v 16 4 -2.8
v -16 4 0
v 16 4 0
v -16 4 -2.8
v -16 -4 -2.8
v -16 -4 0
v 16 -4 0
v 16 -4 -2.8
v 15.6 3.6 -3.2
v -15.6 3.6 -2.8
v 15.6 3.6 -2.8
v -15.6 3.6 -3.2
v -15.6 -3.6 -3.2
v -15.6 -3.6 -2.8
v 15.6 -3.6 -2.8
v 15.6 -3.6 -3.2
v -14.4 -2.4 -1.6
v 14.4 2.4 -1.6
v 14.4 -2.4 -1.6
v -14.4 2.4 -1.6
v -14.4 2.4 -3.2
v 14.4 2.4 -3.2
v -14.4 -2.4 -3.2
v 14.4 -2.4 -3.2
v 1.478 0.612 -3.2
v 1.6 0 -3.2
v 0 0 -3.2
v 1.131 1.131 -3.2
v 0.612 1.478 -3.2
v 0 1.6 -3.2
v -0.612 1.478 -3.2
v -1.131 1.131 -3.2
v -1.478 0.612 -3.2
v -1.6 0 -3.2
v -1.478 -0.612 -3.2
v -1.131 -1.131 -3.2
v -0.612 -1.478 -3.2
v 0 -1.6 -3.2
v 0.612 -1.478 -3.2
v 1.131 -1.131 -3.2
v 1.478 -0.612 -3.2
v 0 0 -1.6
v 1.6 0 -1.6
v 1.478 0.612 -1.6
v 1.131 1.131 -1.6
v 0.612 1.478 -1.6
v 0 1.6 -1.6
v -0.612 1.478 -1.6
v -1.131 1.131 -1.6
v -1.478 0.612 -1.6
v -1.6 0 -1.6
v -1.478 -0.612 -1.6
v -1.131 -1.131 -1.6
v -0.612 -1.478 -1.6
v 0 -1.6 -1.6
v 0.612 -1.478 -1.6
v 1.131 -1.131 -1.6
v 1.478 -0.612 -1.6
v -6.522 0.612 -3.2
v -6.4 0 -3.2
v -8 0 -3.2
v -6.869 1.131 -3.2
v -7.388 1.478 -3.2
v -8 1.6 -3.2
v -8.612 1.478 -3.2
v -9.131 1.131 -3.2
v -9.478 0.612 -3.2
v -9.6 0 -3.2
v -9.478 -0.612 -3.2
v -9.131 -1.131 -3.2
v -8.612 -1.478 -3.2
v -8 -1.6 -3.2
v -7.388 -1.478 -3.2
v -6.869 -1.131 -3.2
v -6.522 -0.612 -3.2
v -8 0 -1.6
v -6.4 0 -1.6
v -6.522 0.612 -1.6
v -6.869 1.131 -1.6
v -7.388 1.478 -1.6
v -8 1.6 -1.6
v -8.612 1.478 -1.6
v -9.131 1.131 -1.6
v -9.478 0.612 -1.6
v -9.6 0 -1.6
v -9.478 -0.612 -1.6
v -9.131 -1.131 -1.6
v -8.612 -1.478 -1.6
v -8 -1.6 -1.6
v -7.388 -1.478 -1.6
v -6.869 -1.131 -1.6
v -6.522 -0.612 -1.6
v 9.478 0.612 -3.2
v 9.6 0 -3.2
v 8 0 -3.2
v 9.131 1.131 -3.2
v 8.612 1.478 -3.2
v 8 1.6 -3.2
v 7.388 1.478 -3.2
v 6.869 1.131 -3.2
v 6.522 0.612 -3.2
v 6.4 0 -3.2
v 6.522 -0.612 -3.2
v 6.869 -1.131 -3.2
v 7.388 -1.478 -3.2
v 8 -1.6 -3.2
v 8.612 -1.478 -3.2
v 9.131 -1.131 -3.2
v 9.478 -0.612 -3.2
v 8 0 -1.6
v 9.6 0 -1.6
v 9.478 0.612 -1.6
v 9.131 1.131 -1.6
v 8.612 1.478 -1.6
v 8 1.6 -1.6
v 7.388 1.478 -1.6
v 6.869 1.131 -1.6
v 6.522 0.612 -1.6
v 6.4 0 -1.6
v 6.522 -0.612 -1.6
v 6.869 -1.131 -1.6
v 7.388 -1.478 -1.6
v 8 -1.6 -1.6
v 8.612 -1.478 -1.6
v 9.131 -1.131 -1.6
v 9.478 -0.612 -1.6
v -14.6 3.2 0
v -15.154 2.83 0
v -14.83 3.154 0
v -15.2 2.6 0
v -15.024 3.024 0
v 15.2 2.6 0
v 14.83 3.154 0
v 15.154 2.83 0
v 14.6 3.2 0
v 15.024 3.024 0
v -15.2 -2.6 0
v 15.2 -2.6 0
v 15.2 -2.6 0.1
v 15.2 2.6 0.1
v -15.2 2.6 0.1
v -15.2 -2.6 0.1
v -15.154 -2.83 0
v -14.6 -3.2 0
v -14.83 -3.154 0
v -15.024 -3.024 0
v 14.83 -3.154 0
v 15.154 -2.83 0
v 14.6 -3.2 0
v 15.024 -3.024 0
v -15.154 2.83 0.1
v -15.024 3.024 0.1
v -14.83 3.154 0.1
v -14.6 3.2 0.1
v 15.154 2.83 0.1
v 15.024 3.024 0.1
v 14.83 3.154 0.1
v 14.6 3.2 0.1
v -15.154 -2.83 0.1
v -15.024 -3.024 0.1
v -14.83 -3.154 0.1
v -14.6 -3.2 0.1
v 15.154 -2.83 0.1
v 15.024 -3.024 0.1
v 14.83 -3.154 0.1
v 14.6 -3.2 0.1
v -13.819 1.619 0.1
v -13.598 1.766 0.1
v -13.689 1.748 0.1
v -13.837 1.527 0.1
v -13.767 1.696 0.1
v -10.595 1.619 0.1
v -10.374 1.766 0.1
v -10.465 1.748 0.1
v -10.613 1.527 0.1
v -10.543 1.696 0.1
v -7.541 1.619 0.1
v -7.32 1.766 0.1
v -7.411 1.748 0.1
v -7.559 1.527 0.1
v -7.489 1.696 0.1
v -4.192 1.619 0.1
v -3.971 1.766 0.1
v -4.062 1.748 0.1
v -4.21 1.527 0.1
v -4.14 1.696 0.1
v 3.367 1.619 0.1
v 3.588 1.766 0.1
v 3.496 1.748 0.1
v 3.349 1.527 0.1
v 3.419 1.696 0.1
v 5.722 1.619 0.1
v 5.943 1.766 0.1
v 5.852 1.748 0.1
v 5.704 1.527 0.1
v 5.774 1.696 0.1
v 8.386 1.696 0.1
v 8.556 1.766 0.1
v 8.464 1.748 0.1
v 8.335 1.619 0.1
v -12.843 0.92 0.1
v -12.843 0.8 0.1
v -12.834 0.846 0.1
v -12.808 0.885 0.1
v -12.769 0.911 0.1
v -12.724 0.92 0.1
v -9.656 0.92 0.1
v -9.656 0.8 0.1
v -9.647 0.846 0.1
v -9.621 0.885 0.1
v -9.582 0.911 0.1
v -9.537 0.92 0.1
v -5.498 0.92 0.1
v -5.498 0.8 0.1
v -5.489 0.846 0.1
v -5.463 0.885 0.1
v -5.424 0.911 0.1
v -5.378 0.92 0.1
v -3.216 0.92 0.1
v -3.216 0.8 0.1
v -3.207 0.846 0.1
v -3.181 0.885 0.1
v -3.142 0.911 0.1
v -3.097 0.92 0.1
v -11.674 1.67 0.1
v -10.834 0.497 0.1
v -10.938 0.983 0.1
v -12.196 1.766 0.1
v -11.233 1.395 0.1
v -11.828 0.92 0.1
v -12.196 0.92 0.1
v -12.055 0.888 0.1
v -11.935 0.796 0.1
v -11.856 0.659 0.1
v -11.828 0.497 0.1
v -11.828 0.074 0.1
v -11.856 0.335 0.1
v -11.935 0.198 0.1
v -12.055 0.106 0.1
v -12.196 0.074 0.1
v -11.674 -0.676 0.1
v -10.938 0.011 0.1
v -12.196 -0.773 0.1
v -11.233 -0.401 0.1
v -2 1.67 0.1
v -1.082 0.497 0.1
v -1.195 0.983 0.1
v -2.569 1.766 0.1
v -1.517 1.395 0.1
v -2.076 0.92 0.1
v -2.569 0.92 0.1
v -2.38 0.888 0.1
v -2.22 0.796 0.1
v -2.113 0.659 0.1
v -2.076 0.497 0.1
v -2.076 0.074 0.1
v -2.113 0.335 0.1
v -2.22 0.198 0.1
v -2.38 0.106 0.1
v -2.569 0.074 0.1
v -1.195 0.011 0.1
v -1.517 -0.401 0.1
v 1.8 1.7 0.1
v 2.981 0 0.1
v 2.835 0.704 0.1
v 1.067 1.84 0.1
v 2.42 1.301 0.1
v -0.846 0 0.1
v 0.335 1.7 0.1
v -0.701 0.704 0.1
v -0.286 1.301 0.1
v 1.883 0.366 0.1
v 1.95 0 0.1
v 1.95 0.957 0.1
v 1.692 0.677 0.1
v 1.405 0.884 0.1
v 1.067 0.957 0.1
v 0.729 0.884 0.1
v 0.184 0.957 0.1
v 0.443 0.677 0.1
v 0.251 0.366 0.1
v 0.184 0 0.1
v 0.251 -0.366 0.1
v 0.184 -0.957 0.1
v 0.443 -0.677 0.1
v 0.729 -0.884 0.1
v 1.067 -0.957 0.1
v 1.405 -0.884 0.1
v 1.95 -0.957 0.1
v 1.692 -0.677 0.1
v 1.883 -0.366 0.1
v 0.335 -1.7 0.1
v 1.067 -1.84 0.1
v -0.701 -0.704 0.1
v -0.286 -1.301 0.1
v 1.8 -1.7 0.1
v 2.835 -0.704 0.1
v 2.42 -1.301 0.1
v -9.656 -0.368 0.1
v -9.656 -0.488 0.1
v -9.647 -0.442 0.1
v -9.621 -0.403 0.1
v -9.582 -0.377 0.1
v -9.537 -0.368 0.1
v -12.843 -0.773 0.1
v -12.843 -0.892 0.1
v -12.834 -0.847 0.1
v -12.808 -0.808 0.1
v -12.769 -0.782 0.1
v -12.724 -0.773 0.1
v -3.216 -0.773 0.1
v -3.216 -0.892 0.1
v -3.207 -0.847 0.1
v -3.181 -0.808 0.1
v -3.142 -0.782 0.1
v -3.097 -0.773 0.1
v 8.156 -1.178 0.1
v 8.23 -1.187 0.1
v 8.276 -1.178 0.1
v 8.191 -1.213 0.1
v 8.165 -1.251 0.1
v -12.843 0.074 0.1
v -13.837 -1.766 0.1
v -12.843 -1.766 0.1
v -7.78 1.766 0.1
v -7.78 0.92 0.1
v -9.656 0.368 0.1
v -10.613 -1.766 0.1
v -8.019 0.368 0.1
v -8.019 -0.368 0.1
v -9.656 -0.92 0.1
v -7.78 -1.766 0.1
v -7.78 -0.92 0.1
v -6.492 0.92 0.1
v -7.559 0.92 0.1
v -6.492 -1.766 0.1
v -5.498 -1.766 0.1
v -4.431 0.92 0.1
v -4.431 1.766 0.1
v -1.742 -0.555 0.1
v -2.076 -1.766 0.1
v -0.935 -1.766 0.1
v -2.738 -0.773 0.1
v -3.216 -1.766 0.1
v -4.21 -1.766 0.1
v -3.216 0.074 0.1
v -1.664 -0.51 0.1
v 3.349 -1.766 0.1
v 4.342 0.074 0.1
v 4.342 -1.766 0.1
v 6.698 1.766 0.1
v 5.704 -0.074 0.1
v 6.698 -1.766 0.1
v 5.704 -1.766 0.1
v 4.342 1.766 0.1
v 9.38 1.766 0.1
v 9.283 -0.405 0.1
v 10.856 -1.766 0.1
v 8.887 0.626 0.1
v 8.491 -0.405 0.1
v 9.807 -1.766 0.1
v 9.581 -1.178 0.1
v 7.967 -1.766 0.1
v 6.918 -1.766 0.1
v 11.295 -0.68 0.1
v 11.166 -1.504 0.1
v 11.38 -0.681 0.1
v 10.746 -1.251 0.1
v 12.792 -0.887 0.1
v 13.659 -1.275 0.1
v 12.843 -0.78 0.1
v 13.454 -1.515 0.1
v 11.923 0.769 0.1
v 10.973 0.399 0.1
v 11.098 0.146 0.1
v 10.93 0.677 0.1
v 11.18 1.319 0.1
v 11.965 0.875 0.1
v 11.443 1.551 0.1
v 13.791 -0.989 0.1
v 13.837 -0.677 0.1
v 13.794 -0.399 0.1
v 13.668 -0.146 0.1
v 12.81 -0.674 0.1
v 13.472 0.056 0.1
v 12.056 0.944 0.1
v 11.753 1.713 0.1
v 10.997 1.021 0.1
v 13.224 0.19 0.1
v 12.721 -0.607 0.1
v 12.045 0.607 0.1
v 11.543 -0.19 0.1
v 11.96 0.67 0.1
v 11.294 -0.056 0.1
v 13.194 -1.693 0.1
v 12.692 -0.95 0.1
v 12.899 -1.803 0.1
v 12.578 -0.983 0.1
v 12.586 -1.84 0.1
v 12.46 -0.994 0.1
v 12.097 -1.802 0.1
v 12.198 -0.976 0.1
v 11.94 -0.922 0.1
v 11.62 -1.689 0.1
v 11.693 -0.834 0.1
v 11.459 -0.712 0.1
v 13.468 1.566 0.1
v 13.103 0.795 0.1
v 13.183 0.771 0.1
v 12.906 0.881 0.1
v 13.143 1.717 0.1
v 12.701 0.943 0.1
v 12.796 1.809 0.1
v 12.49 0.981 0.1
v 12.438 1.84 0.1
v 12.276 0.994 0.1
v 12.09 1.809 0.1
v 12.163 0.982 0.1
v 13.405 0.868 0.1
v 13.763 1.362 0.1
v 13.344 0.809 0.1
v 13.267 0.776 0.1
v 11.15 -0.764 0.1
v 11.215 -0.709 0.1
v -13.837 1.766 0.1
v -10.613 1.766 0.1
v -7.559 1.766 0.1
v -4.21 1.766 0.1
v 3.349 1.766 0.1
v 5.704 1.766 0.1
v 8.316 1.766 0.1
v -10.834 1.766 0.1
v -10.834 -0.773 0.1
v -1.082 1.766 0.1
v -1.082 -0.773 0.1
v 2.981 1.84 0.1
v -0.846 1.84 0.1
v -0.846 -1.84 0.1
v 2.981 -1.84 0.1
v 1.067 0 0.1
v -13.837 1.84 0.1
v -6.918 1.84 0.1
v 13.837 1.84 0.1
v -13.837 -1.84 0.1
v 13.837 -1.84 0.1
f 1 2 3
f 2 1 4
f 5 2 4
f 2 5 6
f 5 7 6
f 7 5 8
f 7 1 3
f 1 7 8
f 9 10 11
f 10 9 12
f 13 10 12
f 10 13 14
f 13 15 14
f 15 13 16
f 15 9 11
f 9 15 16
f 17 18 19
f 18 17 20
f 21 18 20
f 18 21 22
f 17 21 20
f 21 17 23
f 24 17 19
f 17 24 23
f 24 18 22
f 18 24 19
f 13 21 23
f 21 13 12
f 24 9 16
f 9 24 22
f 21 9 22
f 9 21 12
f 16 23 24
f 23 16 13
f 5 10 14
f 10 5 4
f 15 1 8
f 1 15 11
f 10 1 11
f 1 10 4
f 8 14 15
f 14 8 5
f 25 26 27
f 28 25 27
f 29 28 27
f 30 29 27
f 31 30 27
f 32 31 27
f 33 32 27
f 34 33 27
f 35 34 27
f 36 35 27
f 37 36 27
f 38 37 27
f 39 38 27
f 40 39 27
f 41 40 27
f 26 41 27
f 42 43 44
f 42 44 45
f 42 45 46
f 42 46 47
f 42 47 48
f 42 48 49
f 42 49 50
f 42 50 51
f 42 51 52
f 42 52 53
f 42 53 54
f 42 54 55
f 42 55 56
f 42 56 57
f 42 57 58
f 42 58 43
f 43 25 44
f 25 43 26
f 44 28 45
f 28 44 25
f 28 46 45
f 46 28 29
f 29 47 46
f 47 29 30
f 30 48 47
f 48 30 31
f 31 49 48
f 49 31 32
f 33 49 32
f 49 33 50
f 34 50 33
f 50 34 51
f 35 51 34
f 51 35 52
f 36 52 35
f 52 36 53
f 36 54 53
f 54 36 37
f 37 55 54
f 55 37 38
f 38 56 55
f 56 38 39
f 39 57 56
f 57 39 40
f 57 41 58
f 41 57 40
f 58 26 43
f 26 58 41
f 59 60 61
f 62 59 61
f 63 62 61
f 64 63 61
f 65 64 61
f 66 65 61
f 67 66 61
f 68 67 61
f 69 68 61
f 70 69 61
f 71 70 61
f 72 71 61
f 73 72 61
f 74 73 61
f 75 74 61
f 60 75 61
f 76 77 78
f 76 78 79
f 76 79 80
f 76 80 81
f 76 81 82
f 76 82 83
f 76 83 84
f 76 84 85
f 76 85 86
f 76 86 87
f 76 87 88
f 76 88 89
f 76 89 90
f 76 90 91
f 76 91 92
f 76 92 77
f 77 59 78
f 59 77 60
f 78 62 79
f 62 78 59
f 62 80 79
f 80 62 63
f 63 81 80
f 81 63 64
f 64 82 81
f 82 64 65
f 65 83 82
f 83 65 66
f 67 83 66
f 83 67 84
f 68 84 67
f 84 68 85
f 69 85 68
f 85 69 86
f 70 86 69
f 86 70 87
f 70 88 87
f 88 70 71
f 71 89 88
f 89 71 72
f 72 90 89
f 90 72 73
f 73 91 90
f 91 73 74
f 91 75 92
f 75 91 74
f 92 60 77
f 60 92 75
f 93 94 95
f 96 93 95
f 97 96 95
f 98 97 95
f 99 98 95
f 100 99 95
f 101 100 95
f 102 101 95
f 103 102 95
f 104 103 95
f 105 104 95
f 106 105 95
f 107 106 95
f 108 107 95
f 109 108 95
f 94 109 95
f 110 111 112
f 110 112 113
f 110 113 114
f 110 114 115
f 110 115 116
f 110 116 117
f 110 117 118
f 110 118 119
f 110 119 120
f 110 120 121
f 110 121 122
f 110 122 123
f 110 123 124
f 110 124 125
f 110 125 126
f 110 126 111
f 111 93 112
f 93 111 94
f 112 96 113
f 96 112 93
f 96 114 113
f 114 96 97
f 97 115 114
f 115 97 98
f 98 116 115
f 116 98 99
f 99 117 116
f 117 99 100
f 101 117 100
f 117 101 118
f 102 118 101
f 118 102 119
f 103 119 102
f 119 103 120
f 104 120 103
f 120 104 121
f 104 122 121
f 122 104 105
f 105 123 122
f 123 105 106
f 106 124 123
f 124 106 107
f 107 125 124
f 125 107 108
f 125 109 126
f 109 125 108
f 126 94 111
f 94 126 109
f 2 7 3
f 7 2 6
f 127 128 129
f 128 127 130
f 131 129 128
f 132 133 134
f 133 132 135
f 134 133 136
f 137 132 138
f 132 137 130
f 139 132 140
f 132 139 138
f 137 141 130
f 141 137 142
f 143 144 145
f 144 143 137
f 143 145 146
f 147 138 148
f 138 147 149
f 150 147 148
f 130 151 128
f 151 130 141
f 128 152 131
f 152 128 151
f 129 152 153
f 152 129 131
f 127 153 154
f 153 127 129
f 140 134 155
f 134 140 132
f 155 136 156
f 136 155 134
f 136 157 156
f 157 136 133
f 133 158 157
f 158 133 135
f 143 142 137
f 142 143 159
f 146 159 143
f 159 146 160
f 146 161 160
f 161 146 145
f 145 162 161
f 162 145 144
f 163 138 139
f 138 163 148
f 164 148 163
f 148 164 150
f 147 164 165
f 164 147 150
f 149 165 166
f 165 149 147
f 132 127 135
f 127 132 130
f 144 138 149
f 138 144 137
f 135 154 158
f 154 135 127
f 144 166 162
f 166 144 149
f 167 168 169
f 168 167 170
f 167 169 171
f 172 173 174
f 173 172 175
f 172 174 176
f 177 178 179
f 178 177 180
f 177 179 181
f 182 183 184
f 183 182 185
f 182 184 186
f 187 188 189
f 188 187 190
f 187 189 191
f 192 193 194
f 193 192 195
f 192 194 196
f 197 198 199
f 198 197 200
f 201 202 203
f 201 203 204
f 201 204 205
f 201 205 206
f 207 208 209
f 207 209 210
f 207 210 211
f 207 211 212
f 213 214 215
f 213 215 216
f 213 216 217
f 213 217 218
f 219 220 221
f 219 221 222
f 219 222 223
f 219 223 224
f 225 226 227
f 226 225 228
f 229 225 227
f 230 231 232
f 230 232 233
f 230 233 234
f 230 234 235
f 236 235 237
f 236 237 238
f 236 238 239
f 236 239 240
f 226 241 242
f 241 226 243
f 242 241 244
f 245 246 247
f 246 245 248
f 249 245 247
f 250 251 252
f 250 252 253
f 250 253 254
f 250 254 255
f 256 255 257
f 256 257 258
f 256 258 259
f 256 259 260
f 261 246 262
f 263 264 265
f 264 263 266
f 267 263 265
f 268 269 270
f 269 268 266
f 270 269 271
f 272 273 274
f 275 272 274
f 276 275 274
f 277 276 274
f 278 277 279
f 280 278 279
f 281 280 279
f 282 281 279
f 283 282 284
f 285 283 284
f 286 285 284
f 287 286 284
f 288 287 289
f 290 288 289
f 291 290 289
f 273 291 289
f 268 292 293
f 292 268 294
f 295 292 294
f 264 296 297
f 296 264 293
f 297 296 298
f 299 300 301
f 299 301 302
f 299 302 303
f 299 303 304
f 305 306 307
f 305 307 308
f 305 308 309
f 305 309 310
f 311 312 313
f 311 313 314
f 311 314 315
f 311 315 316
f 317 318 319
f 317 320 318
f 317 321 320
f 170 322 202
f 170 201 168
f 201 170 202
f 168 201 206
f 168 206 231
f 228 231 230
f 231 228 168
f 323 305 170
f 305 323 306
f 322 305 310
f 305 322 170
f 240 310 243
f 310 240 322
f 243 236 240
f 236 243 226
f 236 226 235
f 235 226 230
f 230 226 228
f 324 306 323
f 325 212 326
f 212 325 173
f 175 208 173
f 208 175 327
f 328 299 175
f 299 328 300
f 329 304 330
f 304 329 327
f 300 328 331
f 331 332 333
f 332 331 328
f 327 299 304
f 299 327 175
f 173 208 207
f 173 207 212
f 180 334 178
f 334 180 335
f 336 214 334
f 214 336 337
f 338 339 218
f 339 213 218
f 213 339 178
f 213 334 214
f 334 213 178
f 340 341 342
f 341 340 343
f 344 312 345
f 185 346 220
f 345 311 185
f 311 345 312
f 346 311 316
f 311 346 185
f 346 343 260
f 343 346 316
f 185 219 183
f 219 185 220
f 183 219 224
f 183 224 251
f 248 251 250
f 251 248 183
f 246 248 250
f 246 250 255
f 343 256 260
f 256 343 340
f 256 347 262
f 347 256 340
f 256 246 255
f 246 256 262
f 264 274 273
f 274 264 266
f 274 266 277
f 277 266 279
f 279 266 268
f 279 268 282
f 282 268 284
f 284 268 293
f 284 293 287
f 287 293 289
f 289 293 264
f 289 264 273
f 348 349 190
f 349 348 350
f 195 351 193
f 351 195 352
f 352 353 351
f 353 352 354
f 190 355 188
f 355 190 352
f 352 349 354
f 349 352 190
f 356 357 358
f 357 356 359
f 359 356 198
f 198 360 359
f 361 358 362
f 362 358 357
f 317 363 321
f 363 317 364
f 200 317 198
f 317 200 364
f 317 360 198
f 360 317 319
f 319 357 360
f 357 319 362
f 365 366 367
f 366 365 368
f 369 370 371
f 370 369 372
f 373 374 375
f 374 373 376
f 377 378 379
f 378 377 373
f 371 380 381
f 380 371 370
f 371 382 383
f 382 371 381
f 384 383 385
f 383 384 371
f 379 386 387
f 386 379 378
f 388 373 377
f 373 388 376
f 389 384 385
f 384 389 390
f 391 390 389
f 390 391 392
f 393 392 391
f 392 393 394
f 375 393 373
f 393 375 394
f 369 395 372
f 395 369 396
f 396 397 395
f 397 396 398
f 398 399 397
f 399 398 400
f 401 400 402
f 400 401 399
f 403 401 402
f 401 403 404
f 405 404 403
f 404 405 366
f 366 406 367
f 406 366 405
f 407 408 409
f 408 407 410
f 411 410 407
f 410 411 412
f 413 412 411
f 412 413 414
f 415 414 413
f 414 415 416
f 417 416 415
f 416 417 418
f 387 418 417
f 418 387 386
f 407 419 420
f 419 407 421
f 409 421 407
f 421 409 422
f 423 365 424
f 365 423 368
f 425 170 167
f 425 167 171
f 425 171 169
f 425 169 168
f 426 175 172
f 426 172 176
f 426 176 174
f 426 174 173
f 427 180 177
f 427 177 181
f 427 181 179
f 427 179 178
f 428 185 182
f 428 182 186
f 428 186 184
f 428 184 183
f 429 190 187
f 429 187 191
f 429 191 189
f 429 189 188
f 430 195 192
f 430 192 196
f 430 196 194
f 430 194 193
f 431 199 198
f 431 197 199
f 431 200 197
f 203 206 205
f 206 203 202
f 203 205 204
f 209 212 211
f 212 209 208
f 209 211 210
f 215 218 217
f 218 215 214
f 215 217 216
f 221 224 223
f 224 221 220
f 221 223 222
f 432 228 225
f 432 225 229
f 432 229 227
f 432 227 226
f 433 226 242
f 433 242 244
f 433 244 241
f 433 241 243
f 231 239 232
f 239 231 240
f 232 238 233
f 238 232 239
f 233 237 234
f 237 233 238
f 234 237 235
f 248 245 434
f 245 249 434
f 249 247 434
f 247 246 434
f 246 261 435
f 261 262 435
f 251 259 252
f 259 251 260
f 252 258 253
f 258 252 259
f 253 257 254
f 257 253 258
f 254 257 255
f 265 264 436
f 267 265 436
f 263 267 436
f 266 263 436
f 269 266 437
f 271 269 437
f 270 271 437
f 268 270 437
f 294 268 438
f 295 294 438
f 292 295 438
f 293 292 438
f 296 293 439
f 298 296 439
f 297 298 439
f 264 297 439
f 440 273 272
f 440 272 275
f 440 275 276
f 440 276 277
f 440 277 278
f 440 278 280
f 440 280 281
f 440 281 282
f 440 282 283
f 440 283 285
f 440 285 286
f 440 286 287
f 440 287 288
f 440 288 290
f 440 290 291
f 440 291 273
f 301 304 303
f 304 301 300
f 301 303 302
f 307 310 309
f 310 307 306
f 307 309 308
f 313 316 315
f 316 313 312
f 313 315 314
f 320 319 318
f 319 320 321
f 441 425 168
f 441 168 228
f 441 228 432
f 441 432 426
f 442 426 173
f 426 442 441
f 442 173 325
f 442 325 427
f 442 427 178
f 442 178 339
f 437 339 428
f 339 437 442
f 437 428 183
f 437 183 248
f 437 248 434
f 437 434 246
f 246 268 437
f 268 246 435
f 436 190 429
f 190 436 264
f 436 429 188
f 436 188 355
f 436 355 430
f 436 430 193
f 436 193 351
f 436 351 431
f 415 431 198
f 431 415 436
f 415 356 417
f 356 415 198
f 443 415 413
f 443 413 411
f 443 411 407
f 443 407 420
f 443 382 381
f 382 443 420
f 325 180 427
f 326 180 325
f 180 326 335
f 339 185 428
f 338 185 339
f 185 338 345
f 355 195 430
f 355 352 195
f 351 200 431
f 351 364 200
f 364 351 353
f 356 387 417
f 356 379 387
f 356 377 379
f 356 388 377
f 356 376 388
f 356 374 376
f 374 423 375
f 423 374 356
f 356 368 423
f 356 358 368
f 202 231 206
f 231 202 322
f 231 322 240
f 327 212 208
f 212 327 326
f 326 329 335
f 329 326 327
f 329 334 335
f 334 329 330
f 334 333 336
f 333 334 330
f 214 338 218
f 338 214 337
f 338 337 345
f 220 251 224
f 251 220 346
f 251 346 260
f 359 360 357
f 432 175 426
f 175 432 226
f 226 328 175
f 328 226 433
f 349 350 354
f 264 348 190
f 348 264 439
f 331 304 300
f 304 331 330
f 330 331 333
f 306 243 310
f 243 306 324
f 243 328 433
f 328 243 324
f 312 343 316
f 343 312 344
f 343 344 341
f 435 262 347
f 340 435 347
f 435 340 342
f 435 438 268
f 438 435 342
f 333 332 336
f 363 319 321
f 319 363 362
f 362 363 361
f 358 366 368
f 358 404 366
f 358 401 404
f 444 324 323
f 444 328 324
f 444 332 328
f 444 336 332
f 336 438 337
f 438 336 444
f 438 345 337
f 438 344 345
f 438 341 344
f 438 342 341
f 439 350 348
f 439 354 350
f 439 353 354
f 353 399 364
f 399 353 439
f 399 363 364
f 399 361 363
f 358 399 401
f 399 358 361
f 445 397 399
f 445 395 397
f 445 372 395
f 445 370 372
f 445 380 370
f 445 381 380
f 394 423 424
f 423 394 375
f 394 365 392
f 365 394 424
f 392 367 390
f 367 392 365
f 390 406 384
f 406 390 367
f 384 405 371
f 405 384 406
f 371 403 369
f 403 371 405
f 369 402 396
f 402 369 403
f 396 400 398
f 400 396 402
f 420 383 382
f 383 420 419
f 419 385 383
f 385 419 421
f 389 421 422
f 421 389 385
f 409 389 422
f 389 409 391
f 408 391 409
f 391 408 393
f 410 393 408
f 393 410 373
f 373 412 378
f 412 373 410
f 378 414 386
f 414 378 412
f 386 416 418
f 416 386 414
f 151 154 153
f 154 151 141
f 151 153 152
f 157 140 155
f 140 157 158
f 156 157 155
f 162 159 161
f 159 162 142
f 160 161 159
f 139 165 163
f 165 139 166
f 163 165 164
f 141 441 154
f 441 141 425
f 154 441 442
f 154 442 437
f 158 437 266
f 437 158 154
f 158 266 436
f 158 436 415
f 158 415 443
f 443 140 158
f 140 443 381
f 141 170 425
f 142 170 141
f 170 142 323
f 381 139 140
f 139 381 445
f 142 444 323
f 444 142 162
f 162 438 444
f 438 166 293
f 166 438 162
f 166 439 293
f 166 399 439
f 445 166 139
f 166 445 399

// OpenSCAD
use <../lib.scad>
use <2431.scad>
use <6177973b.scad>
function ldraw_lib__2431d15() = [
// 0 Tile  1 x  4 with White "PETRONAS" on Green Background Sticker
// 0 Name: 2431d15.dat
// 0 Author: Vincent Messenet [Cheenzo]
// 0 !LDRAW_ORG Shortcut UPDATE 2026-08
// 0 !LICENSE Licensed under CC BY 4.0 : see CAreadme.txt
// 
// 0 BFC CERTIFY CCW
  [0,"BFC","CERTIFY"],
  [0,"BFC","CCW"],
// 
// 0 !CATEGORY Sticker Shortcut
// 0 !KEYWORDS Bricklink 2431pb0868, Set 75883
// 
// 0 !HISTORY 2026-08-31 [OrionP] Official Update 2026-08
// 
// 1 16 0 0 0 1 0 0 0 1 0 0 0 1 2431.dat
  [1,16,0,0,0,1,0,0,0,1,0,0,0,1, ldraw_lib__2431()],
// 1 16 0 0 0 1 0 0 0 1 0 0 0 1 6177973b.dat
  [1,16,0,0,0,1,0,0,0,1,0,0,0,1, ldraw_lib__6177973b()],
];
module ldraw_lib__2431d15(step=0, col=false, unit=2/5, alt=false, line=0.2, solid=!$preview)
    makepoly(ldraw_lib__2431d15(), step=step, col=col, unit=unit, alt=alt, line=line, solid=solid);
ldraw_lib__2431d15(line=0.2);
